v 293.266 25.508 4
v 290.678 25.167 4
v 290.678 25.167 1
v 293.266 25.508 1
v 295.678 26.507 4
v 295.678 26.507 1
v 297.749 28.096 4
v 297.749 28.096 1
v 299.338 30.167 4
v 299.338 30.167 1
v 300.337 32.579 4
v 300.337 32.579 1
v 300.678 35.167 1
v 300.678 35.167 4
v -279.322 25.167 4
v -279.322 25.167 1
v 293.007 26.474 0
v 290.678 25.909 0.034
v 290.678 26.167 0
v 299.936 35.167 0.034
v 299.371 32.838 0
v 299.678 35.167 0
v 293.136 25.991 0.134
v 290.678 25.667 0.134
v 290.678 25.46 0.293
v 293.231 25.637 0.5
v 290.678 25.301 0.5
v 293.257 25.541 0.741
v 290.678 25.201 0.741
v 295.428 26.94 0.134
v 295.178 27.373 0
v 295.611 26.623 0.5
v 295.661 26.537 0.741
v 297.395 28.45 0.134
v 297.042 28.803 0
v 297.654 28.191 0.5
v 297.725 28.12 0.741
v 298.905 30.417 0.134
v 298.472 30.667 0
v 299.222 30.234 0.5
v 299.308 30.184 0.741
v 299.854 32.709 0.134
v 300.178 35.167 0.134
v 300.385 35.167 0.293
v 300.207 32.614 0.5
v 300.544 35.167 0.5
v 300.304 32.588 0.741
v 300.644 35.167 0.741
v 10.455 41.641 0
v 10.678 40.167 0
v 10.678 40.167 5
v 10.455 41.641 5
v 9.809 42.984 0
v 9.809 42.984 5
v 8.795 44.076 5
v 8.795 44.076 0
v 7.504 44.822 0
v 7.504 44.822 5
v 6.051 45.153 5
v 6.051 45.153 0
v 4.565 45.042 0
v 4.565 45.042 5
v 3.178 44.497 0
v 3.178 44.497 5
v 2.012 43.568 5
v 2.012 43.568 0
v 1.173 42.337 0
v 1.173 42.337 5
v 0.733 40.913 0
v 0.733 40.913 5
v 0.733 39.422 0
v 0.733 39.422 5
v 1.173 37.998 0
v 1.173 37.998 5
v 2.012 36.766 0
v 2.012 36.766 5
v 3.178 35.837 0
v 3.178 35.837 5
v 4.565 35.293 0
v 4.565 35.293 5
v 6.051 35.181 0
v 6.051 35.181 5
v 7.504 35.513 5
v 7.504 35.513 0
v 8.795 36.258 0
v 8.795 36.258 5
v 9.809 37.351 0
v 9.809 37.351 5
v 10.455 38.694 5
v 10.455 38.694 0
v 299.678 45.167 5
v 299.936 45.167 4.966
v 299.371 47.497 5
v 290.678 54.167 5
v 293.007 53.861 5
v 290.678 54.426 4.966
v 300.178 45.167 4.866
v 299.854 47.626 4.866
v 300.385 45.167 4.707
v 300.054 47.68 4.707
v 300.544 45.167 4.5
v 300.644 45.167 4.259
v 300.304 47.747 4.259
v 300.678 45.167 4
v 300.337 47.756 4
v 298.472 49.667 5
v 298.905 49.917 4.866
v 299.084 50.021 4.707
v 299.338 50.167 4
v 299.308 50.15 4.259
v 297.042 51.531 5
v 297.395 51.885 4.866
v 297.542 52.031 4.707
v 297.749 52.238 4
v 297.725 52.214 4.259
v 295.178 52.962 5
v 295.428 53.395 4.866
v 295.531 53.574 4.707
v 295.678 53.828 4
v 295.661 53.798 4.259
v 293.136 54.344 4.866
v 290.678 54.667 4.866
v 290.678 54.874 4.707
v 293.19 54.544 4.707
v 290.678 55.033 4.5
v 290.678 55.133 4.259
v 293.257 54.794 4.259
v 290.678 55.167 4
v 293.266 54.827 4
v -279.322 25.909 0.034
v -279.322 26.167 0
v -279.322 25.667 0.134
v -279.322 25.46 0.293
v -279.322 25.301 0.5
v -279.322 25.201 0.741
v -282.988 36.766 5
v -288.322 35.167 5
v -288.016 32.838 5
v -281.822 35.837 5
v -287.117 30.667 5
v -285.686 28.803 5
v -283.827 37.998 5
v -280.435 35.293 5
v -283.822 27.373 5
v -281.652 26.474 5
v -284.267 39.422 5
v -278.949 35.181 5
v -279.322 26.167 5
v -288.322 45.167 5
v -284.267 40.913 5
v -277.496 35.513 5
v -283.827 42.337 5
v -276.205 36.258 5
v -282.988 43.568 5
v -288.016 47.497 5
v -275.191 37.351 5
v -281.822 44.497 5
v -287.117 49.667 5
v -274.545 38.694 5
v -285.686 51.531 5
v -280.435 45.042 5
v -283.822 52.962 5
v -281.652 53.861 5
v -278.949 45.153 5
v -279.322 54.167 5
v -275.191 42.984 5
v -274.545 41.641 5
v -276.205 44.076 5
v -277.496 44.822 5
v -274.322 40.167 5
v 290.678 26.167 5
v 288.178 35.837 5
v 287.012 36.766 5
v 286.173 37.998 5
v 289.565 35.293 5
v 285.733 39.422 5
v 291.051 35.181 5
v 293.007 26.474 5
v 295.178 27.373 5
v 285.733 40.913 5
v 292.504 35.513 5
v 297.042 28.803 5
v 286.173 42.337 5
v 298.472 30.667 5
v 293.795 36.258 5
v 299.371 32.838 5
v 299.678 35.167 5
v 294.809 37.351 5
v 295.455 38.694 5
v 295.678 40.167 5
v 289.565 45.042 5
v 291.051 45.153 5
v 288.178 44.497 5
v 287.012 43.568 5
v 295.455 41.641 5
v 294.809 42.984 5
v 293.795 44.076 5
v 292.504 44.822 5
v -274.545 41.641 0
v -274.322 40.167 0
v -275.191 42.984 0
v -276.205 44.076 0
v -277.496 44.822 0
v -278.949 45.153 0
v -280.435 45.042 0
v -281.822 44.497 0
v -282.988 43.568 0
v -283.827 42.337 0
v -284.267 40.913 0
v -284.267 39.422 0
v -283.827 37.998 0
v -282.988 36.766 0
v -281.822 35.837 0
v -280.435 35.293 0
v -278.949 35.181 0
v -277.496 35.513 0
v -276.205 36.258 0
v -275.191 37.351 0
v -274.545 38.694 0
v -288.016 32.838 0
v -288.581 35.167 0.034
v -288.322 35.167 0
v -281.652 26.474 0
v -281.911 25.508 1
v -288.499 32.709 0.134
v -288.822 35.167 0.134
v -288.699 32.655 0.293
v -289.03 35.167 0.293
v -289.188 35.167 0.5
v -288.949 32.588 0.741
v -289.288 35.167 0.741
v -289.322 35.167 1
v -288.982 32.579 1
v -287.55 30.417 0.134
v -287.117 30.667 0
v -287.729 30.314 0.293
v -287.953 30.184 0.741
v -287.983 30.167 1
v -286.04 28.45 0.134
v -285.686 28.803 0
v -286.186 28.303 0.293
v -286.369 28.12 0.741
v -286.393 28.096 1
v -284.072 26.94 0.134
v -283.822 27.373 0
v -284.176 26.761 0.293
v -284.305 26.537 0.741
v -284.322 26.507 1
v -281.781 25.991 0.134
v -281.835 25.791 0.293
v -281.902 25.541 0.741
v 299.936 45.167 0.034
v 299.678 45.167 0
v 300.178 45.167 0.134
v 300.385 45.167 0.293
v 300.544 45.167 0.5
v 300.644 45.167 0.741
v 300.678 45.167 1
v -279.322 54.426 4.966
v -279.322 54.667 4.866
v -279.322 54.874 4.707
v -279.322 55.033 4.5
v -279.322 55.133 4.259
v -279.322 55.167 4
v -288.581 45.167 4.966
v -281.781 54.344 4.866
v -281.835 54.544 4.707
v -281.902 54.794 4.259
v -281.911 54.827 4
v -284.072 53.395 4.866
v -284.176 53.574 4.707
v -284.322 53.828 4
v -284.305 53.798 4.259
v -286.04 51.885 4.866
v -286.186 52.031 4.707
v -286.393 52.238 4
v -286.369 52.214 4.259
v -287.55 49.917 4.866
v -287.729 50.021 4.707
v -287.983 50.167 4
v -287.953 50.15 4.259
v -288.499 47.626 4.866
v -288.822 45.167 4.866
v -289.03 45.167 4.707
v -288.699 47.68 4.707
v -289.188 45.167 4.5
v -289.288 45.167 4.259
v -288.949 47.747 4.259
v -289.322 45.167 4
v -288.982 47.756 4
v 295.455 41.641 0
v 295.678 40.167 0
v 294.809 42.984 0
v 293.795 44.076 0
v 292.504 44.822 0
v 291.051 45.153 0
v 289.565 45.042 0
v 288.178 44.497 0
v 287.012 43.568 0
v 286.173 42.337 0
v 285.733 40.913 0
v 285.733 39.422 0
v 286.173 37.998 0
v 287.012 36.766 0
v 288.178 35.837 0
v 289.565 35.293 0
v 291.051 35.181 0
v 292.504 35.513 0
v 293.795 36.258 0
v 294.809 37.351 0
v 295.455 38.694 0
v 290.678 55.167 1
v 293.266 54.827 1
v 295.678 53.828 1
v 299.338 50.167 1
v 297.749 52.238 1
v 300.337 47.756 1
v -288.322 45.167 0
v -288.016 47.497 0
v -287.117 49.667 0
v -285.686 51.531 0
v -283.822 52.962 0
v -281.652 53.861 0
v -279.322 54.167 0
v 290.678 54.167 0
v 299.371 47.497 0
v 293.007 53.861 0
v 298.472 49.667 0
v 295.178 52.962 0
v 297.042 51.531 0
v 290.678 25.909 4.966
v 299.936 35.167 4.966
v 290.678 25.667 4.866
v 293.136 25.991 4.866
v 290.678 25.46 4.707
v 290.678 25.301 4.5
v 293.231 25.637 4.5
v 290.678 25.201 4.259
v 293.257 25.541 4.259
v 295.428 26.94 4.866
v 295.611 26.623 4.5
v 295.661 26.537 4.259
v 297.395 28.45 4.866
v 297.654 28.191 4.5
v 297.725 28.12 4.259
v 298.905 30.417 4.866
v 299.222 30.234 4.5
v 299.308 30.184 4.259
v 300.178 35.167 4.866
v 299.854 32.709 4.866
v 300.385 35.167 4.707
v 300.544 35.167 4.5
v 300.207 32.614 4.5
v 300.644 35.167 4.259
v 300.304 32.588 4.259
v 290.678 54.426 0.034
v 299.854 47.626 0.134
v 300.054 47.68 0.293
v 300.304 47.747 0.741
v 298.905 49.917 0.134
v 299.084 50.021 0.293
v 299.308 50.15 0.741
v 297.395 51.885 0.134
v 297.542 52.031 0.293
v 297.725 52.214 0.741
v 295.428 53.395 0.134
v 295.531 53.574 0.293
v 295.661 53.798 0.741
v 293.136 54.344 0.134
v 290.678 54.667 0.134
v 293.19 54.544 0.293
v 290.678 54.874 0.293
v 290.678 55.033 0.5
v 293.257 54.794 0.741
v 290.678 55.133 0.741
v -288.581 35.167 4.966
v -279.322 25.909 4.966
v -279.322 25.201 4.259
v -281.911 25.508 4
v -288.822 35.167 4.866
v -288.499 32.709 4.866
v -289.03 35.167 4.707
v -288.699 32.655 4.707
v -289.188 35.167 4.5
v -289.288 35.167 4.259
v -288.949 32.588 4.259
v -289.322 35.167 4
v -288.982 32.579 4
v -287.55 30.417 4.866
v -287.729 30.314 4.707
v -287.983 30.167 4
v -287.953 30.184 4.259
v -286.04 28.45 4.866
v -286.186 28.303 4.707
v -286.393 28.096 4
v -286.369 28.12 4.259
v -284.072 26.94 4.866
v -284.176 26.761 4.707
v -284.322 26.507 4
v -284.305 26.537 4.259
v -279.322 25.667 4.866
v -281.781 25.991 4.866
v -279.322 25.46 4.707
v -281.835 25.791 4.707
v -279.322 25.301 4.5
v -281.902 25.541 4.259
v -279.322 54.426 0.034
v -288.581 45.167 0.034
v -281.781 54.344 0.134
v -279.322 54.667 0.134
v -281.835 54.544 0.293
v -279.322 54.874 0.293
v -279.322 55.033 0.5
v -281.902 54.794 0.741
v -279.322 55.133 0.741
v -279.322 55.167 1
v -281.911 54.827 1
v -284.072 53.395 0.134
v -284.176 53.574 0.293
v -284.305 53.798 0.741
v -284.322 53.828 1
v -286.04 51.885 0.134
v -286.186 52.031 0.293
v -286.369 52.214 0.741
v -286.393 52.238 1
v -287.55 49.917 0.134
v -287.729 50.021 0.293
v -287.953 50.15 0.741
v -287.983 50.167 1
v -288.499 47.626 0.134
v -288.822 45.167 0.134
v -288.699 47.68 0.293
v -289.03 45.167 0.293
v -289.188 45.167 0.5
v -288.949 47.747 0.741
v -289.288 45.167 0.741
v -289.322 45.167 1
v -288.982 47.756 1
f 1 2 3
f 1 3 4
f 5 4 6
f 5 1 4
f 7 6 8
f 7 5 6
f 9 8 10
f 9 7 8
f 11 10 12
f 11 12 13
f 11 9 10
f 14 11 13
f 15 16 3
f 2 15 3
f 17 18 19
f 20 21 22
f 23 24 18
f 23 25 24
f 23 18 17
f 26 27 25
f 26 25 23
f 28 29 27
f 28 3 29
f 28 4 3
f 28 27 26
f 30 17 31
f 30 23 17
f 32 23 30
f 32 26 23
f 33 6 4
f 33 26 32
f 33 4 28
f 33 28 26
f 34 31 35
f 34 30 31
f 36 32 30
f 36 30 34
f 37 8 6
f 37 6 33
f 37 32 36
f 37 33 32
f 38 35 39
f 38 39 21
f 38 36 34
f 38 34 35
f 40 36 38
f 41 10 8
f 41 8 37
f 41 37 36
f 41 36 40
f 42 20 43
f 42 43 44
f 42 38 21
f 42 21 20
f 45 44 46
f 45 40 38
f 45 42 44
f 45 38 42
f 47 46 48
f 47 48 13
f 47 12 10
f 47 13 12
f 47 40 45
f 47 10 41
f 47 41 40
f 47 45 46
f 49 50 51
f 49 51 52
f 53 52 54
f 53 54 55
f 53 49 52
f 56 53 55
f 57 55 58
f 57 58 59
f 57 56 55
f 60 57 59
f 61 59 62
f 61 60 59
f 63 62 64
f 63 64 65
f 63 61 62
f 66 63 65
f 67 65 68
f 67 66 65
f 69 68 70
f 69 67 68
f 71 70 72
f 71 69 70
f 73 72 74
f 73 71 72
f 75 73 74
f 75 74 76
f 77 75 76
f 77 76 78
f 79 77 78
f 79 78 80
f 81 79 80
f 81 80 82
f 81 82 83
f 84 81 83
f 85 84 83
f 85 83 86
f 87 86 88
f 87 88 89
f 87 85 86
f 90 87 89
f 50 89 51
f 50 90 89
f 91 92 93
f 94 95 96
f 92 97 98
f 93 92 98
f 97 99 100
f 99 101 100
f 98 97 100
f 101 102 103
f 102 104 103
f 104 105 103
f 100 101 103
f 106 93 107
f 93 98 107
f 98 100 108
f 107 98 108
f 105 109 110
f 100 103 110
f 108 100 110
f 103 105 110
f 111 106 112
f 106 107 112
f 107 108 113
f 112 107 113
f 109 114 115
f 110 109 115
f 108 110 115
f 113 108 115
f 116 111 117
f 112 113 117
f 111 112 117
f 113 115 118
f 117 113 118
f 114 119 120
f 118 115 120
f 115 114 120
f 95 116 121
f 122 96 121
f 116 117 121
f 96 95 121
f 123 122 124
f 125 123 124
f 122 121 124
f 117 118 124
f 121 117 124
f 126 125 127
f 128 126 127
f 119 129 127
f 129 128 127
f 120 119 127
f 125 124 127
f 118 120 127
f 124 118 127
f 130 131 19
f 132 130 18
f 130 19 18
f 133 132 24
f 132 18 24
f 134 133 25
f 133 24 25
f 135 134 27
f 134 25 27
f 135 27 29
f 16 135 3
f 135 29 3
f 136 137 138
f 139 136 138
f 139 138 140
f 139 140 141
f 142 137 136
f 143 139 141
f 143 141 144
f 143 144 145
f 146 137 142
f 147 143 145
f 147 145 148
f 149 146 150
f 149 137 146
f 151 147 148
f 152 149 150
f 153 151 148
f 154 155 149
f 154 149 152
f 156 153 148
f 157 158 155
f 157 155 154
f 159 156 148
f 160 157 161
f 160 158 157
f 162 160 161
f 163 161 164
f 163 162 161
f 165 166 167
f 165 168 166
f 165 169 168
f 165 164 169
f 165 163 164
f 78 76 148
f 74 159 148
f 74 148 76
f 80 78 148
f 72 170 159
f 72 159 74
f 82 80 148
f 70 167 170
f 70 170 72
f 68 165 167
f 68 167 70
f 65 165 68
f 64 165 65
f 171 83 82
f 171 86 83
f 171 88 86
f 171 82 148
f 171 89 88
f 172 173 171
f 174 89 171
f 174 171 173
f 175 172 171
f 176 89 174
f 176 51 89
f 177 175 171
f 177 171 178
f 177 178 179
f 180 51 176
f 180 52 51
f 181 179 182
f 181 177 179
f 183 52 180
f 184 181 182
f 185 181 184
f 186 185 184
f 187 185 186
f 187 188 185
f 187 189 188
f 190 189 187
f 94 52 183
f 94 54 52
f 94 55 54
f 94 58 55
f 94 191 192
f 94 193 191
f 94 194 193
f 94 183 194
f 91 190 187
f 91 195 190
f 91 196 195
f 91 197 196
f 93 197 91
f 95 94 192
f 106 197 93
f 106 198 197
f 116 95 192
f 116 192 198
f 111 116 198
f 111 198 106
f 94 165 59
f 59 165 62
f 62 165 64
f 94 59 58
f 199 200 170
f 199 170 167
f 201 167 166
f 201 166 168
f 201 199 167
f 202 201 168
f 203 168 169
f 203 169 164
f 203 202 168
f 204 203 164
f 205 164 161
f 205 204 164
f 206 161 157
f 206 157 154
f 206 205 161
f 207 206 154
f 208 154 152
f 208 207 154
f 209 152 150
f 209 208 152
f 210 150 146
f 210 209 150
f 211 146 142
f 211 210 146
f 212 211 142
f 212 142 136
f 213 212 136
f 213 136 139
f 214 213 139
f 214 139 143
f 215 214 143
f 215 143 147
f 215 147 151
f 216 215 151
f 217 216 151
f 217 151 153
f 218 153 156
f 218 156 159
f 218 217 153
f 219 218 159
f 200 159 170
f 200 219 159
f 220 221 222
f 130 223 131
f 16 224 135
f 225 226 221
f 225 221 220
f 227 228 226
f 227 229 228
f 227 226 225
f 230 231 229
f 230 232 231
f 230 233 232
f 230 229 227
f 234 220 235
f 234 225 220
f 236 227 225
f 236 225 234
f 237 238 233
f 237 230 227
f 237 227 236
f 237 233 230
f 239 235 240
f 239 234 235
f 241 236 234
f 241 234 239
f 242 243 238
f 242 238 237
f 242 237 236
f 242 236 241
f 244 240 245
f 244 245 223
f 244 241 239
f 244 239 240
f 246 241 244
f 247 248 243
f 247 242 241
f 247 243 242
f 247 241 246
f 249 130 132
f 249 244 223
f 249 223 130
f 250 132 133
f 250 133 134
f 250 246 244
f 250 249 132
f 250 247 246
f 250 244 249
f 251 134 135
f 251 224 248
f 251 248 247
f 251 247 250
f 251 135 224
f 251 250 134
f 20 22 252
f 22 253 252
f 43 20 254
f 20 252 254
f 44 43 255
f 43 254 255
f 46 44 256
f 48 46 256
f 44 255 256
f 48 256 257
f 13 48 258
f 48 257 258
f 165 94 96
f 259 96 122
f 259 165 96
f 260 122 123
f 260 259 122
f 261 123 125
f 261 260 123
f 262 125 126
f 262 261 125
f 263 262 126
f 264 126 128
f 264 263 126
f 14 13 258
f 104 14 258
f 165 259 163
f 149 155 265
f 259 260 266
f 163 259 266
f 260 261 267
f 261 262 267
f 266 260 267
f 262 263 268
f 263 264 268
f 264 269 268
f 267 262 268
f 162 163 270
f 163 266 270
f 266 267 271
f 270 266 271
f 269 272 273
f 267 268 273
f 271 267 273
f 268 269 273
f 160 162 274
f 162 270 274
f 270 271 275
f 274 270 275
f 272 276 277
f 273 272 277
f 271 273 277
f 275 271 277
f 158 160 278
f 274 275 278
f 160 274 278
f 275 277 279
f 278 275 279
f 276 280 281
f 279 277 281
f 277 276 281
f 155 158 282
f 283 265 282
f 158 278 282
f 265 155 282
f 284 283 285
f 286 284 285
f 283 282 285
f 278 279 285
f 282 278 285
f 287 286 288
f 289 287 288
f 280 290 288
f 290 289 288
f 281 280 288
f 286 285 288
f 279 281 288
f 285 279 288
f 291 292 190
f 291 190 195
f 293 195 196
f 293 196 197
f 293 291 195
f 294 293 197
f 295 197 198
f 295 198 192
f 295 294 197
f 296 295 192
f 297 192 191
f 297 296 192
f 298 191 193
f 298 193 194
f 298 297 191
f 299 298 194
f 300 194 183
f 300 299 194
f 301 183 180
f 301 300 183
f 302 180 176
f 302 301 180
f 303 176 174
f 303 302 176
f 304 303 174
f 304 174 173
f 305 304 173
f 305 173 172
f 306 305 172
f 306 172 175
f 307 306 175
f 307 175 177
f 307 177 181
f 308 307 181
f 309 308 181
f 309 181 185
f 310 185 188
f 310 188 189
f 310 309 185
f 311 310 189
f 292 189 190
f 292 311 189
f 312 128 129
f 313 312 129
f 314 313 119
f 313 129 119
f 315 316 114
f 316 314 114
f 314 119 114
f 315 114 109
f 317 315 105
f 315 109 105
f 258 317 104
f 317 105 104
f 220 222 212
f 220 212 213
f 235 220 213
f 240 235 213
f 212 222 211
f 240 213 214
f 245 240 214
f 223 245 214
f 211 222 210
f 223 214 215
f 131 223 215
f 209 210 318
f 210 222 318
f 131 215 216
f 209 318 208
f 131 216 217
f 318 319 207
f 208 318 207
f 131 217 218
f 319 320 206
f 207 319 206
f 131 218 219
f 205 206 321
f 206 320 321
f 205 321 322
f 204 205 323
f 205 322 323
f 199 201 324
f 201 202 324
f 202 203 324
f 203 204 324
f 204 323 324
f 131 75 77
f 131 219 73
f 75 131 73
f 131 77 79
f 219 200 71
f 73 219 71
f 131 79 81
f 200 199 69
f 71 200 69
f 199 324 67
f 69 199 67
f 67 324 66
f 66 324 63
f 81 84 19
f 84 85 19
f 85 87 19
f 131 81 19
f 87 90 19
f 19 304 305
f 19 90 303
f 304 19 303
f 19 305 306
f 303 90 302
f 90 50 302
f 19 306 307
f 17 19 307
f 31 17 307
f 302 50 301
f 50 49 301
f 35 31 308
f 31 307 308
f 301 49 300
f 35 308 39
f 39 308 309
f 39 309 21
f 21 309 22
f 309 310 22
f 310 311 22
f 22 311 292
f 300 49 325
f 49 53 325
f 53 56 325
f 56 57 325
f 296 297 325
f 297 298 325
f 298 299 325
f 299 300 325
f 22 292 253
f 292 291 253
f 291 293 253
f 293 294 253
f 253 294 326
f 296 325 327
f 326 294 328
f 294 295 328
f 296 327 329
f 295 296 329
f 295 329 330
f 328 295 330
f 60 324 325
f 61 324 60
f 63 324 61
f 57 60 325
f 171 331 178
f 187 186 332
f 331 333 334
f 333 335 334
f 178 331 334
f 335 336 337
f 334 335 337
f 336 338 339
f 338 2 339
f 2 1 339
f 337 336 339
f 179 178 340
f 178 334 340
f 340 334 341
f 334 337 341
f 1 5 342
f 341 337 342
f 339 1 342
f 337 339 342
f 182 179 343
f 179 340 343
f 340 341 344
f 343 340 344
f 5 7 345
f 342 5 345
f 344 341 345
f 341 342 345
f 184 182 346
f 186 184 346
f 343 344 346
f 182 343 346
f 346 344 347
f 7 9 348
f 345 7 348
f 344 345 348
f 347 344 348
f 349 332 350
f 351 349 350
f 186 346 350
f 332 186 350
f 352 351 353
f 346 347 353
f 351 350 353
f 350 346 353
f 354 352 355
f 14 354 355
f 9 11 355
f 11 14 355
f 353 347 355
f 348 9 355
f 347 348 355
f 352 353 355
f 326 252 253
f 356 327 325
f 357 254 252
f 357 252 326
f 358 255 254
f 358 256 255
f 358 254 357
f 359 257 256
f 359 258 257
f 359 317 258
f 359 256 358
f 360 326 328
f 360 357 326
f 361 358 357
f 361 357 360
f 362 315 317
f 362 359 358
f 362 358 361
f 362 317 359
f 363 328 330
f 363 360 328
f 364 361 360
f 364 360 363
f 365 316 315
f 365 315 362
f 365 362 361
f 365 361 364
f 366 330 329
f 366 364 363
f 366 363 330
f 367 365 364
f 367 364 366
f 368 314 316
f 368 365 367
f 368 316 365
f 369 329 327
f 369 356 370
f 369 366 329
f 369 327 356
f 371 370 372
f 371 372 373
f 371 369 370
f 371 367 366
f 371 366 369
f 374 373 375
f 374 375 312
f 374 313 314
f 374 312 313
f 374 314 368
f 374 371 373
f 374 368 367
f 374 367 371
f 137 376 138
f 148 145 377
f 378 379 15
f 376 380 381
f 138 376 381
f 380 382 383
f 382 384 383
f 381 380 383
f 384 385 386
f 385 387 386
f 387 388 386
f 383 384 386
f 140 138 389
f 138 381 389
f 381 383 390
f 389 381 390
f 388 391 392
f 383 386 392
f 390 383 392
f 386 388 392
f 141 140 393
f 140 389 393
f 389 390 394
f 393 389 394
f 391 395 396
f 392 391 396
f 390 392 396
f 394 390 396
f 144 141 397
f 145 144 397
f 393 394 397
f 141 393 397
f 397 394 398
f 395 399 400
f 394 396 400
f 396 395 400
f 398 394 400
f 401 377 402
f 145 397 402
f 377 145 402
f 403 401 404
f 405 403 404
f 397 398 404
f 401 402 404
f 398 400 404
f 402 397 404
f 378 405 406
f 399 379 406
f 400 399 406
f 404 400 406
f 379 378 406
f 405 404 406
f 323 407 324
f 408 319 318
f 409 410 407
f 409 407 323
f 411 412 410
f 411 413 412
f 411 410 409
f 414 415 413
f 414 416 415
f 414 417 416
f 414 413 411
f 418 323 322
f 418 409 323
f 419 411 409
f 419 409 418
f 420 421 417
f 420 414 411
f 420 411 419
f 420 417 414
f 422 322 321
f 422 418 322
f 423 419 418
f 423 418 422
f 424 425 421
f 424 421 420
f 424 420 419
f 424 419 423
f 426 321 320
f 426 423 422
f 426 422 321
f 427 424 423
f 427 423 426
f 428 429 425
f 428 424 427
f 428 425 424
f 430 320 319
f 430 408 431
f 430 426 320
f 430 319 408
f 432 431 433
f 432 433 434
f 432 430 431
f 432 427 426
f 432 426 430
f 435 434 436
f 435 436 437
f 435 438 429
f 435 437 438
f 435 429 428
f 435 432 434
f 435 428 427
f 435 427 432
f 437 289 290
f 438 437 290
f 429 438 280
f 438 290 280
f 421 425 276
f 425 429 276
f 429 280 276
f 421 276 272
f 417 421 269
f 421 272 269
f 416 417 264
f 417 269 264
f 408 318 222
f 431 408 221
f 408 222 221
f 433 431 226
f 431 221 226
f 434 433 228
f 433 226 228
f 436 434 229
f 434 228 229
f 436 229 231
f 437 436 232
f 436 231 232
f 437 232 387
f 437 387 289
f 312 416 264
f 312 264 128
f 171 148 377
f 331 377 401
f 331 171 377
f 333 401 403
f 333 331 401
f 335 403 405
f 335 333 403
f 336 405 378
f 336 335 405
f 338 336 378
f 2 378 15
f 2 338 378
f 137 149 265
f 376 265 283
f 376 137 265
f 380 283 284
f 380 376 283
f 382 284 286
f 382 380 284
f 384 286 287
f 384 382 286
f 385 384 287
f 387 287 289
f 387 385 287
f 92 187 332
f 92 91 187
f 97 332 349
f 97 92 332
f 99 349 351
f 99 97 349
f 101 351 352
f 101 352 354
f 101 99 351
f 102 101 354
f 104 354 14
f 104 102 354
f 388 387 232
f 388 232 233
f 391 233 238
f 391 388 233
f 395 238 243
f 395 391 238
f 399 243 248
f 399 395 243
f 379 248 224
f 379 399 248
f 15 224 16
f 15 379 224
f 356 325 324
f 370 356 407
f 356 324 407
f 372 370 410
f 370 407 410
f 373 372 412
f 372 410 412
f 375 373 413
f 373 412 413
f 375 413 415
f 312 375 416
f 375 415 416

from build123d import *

# Parameters (mm, degrees)
SKETCH_1_W      = 590
SKETCH_1_H      = 30
SKETCH_1_R      = 5
EXTRUDE_1_DEPTH = 5
FILLET_1_R      = 10
FILLET_2_R      = 1


with BuildPart() as part:
    # 스케치1 → 보스-돌출1 (new body)
    with BuildSketch(Plane.XY):
        with Locations((5.677604278, 40.167322835)):
            Rectangle(SKETCH_1_W, SKETCH_1_H)
        with Locations((-279.322395722, 40.167322835)):
            Circle(SKETCH_1_R, mode=Mode.SUBTRACT)
        with Locations((290.677604278, 40.167322835)):
            Circle(SKETCH_1_R, mode=Mode.SUBTRACT)
        with Locations((5.677604278, 40.167322835)):
            Circle(SKETCH_1_R, mode=Mode.SUBTRACT)
    extrude(amount=EXTRUDE_1_DEPTH)

    # 필렛1
    fillet_1_edges = [part.edges().sort_by_distance(p)[0] for p in [
        (-289.322395722, 55.167322835, 2.5),
        (300.677604278, 55.167322835, 2.5),
        (300.677604278, 25.167322835, 2.5),
        (-289.322395722, 25.167322835, 2.5),
    ]]
    fillet(fillet_1_edges, radius=FILLET_1_R)

    # 필렛2
    fillet_2_edges = [part.edges().sort_by_distance(p)[0] for p in [
        (300.677604278, 40.167322835, 0),
        (300.677604278, 40.167322835, 5),
        (-289.322395722, 40.167322835, 0),
        (5.677604278, 55.167322835, 0),
        (5.677604278, 25.167322835, 0),
        (-286.393463534, 52.238390647, 0),
        (-286.393463534, 28.096255023, 0),
        (297.748672089, 52.238390647, 0),
        (297.748672089, 28.096255023, 0),
        (5.677604278, 25.167322835, 5),
        (-289.322395722, 40.167322835, 5),
        (5.677604278, 55.167322835, 5),
        (-286.393463534, 52.238390647, 5),
        (-286.393463534, 28.096255023, 5),
        (297.748672089, 52.238390647, 5),
        (297.748672089, 28.096255023, 5),
    ]]
    fillet(fillet_2_edges, radius=FILLET_2_R)


solid = part.part
